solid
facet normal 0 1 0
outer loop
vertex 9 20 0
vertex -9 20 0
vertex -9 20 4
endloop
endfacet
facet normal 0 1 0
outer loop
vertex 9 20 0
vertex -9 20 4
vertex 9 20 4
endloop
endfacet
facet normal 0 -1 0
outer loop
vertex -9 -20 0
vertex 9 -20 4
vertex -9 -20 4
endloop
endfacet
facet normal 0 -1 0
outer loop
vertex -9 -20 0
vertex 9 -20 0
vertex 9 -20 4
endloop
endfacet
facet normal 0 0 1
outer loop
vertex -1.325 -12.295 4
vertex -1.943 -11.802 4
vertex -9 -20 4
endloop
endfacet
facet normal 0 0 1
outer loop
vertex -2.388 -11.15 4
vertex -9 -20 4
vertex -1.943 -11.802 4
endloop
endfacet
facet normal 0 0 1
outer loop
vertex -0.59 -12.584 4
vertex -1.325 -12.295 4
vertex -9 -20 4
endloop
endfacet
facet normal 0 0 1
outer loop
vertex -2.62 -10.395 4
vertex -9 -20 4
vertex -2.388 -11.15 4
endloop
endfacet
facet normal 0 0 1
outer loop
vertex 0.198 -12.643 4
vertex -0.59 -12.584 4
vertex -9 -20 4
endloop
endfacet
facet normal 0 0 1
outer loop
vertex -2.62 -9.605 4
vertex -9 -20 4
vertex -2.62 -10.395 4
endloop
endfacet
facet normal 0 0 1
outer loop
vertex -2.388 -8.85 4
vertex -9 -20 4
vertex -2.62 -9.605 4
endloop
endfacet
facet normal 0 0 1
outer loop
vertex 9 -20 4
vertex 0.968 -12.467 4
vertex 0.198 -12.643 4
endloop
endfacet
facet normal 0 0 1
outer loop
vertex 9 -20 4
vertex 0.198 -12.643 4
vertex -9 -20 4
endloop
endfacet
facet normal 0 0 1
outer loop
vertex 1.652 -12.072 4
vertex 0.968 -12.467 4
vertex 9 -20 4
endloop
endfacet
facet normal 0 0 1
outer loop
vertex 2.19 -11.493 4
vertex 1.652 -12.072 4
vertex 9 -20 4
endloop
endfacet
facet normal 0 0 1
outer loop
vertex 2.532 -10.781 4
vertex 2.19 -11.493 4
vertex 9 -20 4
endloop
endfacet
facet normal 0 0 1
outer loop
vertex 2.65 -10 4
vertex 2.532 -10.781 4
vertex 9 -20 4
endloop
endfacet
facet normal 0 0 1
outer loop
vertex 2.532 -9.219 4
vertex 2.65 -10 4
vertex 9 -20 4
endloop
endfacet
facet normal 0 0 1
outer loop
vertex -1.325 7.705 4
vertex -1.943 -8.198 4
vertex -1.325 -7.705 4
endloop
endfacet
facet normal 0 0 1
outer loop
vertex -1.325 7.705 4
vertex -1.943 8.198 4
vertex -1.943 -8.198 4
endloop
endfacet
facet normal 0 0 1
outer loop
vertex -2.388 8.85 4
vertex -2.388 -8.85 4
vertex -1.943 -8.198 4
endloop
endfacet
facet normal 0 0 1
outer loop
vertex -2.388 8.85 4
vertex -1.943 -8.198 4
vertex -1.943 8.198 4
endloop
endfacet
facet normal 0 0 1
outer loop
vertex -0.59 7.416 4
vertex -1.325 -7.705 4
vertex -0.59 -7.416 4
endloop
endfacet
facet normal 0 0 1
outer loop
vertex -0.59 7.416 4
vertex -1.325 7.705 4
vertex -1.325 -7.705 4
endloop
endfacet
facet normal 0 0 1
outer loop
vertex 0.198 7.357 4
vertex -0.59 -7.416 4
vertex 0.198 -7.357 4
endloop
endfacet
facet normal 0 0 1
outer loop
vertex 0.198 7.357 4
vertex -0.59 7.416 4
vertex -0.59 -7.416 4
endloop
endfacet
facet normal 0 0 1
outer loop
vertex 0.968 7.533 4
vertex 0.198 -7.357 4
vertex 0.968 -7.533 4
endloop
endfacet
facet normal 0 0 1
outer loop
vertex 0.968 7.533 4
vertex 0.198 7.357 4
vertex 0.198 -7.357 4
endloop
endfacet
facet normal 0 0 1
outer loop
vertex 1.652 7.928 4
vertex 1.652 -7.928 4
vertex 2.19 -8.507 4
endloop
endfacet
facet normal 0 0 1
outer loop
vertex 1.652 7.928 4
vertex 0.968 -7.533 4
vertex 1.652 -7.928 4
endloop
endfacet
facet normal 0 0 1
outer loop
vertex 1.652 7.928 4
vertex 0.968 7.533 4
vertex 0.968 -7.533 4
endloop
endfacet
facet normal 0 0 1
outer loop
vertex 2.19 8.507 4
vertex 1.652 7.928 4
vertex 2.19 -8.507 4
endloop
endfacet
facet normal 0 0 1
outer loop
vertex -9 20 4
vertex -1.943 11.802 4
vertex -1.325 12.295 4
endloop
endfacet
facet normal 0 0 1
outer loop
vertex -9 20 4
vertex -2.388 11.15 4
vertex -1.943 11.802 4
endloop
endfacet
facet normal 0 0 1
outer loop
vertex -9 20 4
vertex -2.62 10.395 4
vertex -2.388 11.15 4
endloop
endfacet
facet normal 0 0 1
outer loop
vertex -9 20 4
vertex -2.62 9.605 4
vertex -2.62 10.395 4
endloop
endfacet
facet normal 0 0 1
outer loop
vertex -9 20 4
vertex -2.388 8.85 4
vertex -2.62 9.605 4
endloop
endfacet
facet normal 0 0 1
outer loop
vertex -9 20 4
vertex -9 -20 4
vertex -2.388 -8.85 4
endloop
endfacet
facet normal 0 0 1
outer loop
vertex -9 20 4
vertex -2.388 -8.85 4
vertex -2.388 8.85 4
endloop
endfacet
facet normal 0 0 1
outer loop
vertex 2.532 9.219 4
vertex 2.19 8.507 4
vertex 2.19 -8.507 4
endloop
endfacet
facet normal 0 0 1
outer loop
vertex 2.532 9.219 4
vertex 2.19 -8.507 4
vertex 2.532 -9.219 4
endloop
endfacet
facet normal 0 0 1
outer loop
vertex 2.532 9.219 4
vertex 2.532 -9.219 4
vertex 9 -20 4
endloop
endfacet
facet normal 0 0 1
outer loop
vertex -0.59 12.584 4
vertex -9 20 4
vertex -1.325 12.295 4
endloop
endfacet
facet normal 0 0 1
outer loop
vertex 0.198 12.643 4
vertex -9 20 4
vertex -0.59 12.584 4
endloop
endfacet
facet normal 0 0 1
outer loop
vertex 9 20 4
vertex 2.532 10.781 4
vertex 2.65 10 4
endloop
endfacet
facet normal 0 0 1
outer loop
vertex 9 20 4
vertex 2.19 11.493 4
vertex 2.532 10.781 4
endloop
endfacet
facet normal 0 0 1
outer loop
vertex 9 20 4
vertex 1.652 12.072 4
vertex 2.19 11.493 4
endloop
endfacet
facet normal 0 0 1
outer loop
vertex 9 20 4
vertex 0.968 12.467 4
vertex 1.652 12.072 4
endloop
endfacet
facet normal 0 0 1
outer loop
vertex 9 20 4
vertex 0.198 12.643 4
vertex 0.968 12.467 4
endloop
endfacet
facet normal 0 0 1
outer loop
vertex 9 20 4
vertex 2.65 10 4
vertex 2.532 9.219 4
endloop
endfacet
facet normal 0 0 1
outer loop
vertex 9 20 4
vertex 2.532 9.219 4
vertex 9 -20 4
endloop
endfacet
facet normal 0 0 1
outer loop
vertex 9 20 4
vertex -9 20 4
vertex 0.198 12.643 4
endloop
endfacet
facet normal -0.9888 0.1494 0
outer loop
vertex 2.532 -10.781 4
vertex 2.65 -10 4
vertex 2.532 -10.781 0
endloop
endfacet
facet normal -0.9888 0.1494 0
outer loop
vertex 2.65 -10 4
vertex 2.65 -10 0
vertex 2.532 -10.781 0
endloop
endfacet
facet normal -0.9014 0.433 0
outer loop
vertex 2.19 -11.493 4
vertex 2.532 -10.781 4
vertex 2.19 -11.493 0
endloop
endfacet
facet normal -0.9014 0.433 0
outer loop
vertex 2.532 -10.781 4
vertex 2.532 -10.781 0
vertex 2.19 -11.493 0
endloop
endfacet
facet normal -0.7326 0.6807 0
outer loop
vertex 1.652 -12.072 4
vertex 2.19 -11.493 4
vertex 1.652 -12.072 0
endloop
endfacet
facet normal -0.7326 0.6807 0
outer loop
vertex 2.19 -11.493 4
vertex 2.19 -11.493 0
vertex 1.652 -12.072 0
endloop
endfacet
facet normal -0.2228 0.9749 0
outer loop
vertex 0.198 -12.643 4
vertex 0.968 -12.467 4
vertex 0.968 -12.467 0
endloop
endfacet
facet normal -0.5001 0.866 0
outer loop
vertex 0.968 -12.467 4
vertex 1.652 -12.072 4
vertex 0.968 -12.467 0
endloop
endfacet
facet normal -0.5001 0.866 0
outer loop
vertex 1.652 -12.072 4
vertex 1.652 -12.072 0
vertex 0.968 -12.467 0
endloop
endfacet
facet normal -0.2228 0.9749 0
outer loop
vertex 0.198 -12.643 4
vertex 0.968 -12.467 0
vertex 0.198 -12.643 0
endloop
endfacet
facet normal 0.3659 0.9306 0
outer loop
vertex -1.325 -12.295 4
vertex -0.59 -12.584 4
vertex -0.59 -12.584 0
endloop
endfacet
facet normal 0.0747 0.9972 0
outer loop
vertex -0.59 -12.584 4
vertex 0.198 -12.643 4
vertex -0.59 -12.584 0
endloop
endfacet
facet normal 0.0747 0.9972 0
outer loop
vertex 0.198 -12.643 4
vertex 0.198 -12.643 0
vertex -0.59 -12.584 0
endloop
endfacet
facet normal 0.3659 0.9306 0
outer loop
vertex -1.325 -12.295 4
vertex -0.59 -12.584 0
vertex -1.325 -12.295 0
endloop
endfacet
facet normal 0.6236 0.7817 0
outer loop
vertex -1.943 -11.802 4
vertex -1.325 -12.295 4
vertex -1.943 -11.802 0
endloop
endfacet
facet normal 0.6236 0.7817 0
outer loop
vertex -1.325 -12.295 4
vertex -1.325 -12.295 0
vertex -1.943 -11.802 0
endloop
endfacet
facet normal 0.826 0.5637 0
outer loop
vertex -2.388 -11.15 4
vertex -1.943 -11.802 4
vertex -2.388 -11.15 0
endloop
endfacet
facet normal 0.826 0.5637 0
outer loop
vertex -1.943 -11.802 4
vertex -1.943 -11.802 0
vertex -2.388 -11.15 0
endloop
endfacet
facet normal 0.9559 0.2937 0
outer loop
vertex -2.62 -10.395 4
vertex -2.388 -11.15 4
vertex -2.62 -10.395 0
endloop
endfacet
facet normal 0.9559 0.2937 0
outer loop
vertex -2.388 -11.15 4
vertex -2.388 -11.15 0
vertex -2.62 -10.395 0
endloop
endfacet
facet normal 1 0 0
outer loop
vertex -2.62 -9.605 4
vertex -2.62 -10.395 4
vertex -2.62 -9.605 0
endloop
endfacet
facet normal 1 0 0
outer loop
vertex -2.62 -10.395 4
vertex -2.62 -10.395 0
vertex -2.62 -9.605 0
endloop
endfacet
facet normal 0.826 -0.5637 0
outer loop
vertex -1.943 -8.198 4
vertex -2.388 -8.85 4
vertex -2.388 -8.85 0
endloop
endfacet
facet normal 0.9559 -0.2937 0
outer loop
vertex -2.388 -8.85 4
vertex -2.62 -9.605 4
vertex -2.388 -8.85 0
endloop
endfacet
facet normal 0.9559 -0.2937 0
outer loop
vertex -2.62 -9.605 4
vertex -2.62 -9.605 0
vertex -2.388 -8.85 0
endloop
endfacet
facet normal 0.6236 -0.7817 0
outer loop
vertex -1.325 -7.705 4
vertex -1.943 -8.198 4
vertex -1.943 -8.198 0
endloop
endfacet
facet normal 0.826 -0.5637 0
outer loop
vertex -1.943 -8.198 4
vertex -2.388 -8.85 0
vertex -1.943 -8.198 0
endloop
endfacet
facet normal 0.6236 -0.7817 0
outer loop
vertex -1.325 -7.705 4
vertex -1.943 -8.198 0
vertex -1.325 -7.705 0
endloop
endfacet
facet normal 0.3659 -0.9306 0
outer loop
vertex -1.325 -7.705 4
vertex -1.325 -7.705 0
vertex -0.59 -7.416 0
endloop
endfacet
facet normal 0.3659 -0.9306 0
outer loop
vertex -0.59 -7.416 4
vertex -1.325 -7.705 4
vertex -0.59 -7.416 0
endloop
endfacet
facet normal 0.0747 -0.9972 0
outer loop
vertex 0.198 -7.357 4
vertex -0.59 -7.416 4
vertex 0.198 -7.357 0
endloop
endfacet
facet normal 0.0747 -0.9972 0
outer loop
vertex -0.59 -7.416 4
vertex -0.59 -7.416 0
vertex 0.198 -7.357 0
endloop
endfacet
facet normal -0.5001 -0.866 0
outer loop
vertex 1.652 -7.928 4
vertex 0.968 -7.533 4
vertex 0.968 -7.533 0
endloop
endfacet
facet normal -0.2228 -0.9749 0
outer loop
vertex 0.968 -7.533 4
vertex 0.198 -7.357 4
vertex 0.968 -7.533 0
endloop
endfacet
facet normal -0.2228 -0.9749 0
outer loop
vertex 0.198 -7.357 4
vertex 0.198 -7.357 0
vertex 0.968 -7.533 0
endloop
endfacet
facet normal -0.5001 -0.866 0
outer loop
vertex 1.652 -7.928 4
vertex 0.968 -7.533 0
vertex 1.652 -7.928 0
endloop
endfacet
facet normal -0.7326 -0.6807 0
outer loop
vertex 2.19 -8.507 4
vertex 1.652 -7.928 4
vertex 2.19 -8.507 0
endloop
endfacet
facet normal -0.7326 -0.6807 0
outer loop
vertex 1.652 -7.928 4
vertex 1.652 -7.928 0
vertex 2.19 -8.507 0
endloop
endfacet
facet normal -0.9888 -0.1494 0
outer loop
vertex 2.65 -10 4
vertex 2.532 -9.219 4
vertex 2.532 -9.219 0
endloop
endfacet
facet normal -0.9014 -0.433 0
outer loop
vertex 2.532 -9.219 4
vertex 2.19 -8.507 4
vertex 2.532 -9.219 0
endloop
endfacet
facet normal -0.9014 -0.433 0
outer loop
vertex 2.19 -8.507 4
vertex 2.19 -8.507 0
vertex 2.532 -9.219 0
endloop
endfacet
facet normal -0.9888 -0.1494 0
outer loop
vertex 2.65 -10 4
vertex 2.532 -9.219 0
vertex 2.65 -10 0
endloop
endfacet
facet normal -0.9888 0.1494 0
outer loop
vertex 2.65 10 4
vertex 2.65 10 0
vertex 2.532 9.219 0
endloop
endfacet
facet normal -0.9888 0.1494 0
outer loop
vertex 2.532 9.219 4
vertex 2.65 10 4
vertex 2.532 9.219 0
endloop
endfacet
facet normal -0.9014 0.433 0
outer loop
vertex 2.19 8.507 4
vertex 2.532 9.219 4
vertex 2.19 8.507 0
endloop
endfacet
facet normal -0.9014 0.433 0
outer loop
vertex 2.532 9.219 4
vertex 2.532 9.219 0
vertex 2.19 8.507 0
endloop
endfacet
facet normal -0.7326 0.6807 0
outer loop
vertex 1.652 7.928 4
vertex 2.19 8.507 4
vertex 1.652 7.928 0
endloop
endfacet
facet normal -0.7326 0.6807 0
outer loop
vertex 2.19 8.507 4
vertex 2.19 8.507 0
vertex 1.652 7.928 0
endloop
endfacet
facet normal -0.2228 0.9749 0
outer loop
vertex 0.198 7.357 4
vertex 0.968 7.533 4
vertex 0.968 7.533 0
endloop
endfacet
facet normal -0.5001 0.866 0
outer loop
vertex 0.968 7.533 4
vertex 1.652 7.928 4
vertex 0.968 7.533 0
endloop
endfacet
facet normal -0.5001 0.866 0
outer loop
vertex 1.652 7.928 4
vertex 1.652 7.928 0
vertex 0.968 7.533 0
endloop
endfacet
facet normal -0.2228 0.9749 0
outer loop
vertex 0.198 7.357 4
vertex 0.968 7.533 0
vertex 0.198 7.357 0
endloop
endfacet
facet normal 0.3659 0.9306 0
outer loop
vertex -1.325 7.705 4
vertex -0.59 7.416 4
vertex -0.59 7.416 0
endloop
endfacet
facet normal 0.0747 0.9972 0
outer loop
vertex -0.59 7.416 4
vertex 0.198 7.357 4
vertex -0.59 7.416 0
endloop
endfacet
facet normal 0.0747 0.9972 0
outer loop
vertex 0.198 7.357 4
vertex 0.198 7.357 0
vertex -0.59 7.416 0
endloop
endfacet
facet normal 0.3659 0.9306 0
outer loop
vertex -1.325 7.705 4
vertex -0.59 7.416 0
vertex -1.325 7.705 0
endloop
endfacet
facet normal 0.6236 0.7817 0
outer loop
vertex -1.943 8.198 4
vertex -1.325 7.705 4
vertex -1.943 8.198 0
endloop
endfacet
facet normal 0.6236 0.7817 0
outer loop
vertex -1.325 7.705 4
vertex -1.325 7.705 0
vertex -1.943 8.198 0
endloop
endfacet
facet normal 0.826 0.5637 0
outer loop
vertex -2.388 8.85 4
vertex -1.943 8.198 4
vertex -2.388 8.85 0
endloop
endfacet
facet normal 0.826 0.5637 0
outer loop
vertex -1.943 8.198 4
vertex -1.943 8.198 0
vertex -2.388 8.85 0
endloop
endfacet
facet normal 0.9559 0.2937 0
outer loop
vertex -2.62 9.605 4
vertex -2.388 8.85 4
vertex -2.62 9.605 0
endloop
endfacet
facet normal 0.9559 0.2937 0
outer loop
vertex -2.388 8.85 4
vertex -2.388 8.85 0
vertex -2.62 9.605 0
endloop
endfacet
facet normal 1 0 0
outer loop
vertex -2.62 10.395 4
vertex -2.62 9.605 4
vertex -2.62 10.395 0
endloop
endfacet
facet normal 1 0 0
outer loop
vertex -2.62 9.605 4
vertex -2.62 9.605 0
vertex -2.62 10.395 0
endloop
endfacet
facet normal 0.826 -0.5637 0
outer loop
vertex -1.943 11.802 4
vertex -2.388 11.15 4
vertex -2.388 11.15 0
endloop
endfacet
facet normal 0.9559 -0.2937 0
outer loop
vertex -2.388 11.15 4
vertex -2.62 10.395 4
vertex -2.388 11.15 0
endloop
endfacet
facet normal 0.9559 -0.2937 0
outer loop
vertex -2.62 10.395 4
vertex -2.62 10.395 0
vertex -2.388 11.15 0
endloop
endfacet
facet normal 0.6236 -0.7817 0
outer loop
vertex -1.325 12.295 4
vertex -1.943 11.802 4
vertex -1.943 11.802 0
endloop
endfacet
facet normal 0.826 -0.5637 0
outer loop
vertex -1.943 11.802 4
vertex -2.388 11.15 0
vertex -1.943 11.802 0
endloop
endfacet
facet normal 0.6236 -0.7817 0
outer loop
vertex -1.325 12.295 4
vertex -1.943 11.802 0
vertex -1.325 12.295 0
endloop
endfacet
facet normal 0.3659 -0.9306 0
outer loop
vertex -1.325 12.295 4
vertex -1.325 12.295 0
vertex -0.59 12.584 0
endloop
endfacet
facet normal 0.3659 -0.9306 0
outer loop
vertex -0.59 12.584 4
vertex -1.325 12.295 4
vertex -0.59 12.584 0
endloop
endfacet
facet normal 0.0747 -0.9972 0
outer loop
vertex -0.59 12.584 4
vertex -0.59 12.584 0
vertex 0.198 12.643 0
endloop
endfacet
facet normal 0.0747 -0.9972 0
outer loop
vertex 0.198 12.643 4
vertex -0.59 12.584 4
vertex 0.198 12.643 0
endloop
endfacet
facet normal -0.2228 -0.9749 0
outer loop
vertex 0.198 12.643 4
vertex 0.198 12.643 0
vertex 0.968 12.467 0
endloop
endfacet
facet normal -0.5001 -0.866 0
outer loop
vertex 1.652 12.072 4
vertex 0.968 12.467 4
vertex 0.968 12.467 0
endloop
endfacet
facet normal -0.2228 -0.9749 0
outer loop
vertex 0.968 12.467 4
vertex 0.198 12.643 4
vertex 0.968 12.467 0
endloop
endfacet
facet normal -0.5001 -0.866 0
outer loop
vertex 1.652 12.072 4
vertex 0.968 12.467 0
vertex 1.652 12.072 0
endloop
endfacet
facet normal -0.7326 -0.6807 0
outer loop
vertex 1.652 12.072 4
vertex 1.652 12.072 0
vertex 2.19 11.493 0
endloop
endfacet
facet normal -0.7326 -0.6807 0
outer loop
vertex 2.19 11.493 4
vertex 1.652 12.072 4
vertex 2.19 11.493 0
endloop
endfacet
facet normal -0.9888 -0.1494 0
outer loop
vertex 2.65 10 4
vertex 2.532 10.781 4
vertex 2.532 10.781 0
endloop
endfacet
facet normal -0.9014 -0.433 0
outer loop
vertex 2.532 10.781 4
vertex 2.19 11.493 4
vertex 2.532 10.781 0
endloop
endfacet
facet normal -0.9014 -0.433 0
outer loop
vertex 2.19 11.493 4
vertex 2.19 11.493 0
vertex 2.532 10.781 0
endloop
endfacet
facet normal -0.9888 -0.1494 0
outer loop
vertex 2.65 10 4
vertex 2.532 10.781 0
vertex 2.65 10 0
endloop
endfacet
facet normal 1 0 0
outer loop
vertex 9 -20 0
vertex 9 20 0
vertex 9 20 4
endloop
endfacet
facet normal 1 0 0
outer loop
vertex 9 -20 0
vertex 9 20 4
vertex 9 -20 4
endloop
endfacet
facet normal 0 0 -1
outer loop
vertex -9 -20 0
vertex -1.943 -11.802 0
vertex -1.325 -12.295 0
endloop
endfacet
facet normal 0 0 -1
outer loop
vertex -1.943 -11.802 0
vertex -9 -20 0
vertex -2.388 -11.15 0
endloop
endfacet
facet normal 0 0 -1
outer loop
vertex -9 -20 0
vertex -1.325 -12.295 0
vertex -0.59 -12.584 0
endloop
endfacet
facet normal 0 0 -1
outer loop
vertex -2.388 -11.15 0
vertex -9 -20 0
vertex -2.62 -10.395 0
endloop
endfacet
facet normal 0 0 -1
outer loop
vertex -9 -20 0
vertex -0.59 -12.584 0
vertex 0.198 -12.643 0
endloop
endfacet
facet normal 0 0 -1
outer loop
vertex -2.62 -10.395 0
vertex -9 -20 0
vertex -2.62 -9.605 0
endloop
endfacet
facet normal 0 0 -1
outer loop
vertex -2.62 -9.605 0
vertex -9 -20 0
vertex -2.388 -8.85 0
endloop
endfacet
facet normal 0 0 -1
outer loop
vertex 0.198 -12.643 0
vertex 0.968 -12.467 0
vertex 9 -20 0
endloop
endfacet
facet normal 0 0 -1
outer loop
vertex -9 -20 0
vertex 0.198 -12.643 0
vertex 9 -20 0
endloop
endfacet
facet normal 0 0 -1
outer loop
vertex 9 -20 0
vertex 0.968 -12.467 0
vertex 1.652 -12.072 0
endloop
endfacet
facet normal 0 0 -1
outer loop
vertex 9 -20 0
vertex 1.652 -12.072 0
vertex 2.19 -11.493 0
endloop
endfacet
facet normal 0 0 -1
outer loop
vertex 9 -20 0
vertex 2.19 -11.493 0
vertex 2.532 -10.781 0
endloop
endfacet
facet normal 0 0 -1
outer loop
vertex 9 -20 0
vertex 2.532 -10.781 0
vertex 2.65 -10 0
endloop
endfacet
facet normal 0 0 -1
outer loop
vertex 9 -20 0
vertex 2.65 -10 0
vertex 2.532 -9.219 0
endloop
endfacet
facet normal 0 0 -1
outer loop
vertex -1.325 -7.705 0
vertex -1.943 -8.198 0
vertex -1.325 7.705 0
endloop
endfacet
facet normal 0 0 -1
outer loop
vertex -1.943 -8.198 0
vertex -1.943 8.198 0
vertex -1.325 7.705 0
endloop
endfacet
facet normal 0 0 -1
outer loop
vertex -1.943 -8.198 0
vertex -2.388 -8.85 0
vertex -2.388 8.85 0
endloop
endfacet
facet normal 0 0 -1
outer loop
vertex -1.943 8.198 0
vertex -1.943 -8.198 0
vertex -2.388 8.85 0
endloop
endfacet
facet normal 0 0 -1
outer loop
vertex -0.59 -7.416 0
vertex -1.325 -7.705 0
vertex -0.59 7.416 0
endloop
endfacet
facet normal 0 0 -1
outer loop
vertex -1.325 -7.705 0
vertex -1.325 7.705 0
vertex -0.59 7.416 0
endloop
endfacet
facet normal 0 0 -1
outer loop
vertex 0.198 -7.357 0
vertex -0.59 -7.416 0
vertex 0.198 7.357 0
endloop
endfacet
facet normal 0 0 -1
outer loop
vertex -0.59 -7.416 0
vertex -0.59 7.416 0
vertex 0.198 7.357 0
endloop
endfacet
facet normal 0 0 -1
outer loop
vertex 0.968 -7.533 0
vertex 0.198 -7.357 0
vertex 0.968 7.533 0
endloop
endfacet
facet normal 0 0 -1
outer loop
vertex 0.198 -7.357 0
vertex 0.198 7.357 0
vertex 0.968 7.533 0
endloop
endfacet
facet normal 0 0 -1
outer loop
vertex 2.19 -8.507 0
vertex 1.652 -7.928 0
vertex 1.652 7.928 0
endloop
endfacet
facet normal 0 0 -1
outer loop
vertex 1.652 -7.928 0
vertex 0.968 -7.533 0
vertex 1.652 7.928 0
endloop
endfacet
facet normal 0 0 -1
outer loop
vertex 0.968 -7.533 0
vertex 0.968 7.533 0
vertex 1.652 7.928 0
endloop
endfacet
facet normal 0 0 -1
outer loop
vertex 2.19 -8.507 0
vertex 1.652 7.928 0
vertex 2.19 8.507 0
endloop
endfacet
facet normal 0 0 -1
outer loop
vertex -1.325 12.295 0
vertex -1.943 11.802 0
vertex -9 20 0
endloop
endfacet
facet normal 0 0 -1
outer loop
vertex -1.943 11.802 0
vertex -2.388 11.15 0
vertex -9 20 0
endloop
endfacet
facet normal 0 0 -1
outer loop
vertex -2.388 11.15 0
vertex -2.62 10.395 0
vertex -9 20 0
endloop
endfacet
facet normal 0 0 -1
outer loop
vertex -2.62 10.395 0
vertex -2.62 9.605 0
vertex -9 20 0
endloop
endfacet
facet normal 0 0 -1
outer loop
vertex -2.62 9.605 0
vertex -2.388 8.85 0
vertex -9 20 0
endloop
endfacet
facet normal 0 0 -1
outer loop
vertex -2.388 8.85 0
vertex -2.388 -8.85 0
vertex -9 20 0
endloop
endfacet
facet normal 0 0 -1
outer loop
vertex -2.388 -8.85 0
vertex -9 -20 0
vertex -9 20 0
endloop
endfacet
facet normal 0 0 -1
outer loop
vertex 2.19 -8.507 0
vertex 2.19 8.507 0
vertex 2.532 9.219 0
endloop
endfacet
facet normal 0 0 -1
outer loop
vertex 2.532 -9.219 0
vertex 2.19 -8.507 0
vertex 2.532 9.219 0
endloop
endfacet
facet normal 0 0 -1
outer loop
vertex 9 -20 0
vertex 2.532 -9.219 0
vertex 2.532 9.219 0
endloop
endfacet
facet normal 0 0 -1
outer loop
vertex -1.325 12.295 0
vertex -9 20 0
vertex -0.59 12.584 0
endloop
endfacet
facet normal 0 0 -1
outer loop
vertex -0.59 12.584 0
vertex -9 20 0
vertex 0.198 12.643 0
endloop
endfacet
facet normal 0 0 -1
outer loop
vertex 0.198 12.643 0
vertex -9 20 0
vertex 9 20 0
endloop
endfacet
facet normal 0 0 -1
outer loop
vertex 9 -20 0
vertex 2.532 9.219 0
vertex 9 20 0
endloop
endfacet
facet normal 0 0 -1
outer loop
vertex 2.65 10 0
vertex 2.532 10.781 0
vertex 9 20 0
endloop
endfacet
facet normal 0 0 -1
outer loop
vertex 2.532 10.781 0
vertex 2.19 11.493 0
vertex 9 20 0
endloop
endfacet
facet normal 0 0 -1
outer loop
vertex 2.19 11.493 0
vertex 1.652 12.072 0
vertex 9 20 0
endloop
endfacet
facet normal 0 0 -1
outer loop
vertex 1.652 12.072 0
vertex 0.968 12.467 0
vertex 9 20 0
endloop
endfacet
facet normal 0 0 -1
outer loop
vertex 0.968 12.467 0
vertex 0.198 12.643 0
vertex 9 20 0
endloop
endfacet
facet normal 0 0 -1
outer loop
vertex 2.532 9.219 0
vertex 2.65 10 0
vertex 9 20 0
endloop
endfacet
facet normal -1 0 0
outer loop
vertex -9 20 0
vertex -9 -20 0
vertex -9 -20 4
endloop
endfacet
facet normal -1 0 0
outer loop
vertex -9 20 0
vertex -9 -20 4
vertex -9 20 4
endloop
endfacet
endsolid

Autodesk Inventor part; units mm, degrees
ref_plane "YZ Plane" through (0, 0, 0) normal (1, 0, 0) x (0, 1, 0)
ref_plane "XZ Plane" through (0, 0, 0) normal (0, 1, 0) x (-1, 0, 0)
ref_plane "XY Plane" through (0, 0, 0) normal (0, 0, 1) x (1, 0, 0)
sketch "Sketch1" plane through (0, 0, 0) normal (0, 0, 1) x (1, 0, 0)
  line L0 (-9, 20) -> (9, 20)
  line L1 (9, 20) -> (9, -20)
  line L2 (9, -20) -> (-9, -20)
  line L3 (-9, -20) -> (-9, 20)
  line L4 (-9, 20) -> (9, -20) construction
  line L5 (9, 20) -> (-9, -20) construction
  circle A0 centre (0, 10) radius 2.65
  line L6 (-9, 0) -> (9, 0) construction
  circle A1 centre (0, -10) radius 2.65
  point P0 (0, 0)
  dimension "d0" = 18
  dimension "d2" = 40
  dimension "d3" = 5.3
  dimension "d4" = 10
  dimension "d5" = 9
extrude "Extrusion1" add sketch "Sketch1" along normal blind 4
properties part number "2 Hole Joining Strip Plate"
